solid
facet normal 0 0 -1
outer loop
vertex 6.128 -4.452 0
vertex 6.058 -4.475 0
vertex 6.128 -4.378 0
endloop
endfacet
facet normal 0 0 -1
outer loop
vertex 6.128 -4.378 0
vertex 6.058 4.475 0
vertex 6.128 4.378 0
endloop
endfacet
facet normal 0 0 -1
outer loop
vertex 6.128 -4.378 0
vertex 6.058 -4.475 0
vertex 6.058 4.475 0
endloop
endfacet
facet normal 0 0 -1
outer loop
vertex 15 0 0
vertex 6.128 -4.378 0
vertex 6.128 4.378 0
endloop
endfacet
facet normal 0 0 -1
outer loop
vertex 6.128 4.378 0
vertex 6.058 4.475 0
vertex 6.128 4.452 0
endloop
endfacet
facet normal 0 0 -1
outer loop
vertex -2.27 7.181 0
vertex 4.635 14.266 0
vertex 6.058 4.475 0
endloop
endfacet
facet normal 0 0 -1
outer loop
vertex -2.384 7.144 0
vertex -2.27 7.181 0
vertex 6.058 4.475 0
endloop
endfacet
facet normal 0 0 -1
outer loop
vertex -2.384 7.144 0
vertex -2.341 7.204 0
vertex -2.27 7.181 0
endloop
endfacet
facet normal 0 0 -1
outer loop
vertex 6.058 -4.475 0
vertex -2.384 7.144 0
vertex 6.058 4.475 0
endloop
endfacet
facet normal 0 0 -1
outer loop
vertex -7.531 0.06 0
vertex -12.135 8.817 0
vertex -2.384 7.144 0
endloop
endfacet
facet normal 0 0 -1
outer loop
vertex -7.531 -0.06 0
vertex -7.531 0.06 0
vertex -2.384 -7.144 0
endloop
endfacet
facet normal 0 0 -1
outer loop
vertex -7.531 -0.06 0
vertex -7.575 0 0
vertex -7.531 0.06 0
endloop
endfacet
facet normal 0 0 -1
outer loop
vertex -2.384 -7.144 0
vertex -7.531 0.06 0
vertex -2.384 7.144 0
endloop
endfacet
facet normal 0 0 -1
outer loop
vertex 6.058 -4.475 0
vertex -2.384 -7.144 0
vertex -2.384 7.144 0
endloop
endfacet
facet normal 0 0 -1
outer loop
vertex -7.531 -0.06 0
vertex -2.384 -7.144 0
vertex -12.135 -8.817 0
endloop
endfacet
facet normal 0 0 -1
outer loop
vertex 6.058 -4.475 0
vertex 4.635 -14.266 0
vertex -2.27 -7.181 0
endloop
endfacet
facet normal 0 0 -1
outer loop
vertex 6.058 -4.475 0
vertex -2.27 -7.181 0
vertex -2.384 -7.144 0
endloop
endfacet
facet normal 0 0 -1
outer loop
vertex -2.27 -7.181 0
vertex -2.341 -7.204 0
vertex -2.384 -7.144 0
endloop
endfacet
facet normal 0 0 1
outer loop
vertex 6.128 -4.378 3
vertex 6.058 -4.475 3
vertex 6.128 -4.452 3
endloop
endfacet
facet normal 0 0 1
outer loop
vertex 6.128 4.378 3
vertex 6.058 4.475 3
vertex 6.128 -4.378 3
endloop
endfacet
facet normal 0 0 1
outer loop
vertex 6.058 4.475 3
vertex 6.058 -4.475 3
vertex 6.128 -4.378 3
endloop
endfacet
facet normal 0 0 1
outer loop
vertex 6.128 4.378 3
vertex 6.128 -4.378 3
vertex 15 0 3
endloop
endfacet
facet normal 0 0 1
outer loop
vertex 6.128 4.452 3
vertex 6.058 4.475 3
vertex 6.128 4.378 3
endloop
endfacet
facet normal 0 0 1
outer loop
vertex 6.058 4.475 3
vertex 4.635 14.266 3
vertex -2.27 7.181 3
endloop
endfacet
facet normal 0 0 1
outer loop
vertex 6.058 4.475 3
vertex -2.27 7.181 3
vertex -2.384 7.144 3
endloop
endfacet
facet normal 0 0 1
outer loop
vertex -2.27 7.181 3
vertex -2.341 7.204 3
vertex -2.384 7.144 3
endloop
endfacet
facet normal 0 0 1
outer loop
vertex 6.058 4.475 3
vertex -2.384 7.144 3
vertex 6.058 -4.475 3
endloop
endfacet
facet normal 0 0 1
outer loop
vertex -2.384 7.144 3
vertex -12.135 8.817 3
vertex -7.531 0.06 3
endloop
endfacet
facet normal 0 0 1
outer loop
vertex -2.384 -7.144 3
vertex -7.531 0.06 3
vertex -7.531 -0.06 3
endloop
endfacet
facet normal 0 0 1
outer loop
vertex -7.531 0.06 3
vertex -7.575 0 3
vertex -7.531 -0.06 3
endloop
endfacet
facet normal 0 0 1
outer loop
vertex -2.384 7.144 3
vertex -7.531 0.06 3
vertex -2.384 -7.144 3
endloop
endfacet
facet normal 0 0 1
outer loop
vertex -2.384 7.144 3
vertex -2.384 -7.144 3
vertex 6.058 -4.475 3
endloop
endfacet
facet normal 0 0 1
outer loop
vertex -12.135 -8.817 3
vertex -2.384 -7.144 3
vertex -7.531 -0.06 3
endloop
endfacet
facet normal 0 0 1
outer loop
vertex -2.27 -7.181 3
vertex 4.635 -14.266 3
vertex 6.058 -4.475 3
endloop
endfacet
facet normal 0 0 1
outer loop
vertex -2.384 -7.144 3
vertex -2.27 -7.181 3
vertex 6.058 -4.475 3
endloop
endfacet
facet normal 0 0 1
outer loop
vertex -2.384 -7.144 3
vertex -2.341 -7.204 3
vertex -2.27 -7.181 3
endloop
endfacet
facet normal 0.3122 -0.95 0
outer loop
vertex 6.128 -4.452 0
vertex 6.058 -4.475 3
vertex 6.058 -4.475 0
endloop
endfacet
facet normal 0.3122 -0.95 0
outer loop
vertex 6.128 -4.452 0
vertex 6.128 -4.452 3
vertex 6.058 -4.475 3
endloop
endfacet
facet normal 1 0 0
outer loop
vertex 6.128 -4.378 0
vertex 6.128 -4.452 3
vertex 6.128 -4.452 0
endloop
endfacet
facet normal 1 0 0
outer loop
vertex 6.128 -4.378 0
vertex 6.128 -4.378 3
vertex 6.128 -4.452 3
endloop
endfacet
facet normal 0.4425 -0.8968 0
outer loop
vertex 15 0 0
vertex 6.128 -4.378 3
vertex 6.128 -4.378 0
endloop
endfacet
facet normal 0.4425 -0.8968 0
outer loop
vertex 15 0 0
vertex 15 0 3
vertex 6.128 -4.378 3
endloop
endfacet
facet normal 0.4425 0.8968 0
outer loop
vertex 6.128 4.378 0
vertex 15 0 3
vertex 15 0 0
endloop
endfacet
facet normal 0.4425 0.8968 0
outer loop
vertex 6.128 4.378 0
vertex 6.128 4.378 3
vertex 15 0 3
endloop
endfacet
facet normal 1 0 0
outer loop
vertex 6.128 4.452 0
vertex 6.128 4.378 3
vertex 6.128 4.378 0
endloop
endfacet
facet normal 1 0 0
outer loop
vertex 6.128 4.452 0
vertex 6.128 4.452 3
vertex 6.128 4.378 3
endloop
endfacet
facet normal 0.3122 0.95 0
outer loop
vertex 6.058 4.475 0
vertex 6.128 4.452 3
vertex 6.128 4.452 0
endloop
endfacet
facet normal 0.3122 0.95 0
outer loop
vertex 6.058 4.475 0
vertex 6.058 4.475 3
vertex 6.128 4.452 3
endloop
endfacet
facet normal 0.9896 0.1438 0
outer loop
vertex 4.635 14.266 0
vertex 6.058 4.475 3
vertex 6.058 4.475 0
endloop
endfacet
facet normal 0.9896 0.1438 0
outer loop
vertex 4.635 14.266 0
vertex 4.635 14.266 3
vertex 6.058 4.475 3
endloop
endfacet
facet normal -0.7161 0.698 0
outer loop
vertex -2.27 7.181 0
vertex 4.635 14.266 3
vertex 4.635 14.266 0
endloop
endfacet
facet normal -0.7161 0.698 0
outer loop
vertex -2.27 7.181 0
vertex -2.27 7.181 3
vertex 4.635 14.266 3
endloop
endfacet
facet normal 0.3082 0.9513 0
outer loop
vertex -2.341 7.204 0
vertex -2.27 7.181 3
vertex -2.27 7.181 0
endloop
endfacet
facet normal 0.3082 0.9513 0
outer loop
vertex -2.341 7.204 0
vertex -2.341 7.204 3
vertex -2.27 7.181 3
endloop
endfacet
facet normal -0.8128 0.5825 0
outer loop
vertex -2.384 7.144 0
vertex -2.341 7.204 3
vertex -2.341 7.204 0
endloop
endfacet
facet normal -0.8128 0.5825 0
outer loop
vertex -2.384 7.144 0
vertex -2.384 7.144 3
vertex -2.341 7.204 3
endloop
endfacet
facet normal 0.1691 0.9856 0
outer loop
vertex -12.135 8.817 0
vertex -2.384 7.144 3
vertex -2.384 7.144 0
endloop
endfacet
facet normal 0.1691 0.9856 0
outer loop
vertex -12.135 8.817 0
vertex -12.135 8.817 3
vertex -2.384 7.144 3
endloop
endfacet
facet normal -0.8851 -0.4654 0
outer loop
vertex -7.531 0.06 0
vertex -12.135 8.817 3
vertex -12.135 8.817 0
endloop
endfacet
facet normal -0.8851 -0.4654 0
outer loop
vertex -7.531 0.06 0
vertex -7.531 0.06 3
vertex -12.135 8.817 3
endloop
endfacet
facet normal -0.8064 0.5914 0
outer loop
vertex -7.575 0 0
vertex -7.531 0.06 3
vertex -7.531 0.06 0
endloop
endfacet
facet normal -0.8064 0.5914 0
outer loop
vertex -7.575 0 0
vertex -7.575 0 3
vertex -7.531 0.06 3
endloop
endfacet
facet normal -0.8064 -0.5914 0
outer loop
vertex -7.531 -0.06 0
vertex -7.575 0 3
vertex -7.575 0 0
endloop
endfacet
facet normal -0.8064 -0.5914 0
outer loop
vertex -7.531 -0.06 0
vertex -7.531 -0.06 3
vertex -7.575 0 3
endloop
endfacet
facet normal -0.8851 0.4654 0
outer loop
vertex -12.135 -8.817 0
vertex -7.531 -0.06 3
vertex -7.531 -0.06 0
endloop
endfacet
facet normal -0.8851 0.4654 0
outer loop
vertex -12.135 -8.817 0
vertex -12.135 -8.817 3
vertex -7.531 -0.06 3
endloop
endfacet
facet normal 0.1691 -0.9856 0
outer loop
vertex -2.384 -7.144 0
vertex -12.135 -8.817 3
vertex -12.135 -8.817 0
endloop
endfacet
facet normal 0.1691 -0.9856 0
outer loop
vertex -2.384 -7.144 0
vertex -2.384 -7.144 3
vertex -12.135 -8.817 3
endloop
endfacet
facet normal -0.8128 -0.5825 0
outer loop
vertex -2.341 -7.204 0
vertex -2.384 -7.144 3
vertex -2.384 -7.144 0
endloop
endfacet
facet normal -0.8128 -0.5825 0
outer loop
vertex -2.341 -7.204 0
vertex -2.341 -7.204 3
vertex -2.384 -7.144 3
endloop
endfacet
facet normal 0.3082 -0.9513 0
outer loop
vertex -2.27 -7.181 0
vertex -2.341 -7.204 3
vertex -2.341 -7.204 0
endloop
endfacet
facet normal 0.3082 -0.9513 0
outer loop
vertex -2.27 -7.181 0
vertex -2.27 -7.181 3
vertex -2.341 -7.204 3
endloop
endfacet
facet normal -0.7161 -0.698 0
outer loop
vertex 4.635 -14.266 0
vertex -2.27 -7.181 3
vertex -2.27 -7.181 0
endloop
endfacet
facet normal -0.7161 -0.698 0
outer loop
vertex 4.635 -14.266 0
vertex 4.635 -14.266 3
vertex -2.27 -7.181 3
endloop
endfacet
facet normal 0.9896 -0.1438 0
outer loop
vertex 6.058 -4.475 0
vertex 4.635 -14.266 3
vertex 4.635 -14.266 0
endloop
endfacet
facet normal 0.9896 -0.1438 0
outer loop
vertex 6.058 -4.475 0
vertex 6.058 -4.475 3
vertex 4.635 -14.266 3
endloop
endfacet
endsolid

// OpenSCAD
//-- Parametric star
//-- (c)  2010 Juan Gonzalez-Gomez (Obijuan) juan@iearobotics.com
//-- GPL license

//-- The 2*N points of an N-ponted star are calculated as follows:
//-- There are two circunferences:  the inner and outer.  Outer points are located
//-- at angles: 0, 360/N, 360*2/N and on the outer circunference
//-- The inner points have the same angular distance but they are 360/(2*N) rotated
//-- respect to the outers. They are located on the inner circunference

//--- INPUT PARAMETERS:
//--- N: Number of points
//--  h: Height
//-- ri: Inner radius
//-- ro: outer radius
module parametric_star(N=5, h=3, ri=15, re=30) {

  //-- Calculate and draw a 2D tip of the star
 //-- INPUT: 
 //-- n: Number of the tip (from 0 to N-1)
  module tipstar(n) {
     i1 =  [ri*cos(-360*n/N+360/(N*2)), ri*sin(-360*n/N+360/(N*2))];
    e1 = [re*cos(-360*n/N), re*sin(-360*n/N)];
    i2 = [ri*cos(-360*(n+1)/N+360/(N*2)), ri*sin(-360*(n+1)/N+360/(N*2))];
    polygon([ i1, e1, i2]);
  }

  //-- Draw the 2D star and extrude
  
   //-- The star is the union of N 2D tips. 
   //-- A inner cylinder is also needed for filling
   //-- A flat (2D) star is built. The it is extruded
    linear_extrude(height=h) 
    union() {
      for (i=[0:N-1]) {
         tipstar(i);
      }
      rotate([0,0,360/(2*N)]) circle(r=ri+ri*0.01,$fn=N);
    }
}

//-- Example
parametric_star(N=5, ri=15/2,re=15);
